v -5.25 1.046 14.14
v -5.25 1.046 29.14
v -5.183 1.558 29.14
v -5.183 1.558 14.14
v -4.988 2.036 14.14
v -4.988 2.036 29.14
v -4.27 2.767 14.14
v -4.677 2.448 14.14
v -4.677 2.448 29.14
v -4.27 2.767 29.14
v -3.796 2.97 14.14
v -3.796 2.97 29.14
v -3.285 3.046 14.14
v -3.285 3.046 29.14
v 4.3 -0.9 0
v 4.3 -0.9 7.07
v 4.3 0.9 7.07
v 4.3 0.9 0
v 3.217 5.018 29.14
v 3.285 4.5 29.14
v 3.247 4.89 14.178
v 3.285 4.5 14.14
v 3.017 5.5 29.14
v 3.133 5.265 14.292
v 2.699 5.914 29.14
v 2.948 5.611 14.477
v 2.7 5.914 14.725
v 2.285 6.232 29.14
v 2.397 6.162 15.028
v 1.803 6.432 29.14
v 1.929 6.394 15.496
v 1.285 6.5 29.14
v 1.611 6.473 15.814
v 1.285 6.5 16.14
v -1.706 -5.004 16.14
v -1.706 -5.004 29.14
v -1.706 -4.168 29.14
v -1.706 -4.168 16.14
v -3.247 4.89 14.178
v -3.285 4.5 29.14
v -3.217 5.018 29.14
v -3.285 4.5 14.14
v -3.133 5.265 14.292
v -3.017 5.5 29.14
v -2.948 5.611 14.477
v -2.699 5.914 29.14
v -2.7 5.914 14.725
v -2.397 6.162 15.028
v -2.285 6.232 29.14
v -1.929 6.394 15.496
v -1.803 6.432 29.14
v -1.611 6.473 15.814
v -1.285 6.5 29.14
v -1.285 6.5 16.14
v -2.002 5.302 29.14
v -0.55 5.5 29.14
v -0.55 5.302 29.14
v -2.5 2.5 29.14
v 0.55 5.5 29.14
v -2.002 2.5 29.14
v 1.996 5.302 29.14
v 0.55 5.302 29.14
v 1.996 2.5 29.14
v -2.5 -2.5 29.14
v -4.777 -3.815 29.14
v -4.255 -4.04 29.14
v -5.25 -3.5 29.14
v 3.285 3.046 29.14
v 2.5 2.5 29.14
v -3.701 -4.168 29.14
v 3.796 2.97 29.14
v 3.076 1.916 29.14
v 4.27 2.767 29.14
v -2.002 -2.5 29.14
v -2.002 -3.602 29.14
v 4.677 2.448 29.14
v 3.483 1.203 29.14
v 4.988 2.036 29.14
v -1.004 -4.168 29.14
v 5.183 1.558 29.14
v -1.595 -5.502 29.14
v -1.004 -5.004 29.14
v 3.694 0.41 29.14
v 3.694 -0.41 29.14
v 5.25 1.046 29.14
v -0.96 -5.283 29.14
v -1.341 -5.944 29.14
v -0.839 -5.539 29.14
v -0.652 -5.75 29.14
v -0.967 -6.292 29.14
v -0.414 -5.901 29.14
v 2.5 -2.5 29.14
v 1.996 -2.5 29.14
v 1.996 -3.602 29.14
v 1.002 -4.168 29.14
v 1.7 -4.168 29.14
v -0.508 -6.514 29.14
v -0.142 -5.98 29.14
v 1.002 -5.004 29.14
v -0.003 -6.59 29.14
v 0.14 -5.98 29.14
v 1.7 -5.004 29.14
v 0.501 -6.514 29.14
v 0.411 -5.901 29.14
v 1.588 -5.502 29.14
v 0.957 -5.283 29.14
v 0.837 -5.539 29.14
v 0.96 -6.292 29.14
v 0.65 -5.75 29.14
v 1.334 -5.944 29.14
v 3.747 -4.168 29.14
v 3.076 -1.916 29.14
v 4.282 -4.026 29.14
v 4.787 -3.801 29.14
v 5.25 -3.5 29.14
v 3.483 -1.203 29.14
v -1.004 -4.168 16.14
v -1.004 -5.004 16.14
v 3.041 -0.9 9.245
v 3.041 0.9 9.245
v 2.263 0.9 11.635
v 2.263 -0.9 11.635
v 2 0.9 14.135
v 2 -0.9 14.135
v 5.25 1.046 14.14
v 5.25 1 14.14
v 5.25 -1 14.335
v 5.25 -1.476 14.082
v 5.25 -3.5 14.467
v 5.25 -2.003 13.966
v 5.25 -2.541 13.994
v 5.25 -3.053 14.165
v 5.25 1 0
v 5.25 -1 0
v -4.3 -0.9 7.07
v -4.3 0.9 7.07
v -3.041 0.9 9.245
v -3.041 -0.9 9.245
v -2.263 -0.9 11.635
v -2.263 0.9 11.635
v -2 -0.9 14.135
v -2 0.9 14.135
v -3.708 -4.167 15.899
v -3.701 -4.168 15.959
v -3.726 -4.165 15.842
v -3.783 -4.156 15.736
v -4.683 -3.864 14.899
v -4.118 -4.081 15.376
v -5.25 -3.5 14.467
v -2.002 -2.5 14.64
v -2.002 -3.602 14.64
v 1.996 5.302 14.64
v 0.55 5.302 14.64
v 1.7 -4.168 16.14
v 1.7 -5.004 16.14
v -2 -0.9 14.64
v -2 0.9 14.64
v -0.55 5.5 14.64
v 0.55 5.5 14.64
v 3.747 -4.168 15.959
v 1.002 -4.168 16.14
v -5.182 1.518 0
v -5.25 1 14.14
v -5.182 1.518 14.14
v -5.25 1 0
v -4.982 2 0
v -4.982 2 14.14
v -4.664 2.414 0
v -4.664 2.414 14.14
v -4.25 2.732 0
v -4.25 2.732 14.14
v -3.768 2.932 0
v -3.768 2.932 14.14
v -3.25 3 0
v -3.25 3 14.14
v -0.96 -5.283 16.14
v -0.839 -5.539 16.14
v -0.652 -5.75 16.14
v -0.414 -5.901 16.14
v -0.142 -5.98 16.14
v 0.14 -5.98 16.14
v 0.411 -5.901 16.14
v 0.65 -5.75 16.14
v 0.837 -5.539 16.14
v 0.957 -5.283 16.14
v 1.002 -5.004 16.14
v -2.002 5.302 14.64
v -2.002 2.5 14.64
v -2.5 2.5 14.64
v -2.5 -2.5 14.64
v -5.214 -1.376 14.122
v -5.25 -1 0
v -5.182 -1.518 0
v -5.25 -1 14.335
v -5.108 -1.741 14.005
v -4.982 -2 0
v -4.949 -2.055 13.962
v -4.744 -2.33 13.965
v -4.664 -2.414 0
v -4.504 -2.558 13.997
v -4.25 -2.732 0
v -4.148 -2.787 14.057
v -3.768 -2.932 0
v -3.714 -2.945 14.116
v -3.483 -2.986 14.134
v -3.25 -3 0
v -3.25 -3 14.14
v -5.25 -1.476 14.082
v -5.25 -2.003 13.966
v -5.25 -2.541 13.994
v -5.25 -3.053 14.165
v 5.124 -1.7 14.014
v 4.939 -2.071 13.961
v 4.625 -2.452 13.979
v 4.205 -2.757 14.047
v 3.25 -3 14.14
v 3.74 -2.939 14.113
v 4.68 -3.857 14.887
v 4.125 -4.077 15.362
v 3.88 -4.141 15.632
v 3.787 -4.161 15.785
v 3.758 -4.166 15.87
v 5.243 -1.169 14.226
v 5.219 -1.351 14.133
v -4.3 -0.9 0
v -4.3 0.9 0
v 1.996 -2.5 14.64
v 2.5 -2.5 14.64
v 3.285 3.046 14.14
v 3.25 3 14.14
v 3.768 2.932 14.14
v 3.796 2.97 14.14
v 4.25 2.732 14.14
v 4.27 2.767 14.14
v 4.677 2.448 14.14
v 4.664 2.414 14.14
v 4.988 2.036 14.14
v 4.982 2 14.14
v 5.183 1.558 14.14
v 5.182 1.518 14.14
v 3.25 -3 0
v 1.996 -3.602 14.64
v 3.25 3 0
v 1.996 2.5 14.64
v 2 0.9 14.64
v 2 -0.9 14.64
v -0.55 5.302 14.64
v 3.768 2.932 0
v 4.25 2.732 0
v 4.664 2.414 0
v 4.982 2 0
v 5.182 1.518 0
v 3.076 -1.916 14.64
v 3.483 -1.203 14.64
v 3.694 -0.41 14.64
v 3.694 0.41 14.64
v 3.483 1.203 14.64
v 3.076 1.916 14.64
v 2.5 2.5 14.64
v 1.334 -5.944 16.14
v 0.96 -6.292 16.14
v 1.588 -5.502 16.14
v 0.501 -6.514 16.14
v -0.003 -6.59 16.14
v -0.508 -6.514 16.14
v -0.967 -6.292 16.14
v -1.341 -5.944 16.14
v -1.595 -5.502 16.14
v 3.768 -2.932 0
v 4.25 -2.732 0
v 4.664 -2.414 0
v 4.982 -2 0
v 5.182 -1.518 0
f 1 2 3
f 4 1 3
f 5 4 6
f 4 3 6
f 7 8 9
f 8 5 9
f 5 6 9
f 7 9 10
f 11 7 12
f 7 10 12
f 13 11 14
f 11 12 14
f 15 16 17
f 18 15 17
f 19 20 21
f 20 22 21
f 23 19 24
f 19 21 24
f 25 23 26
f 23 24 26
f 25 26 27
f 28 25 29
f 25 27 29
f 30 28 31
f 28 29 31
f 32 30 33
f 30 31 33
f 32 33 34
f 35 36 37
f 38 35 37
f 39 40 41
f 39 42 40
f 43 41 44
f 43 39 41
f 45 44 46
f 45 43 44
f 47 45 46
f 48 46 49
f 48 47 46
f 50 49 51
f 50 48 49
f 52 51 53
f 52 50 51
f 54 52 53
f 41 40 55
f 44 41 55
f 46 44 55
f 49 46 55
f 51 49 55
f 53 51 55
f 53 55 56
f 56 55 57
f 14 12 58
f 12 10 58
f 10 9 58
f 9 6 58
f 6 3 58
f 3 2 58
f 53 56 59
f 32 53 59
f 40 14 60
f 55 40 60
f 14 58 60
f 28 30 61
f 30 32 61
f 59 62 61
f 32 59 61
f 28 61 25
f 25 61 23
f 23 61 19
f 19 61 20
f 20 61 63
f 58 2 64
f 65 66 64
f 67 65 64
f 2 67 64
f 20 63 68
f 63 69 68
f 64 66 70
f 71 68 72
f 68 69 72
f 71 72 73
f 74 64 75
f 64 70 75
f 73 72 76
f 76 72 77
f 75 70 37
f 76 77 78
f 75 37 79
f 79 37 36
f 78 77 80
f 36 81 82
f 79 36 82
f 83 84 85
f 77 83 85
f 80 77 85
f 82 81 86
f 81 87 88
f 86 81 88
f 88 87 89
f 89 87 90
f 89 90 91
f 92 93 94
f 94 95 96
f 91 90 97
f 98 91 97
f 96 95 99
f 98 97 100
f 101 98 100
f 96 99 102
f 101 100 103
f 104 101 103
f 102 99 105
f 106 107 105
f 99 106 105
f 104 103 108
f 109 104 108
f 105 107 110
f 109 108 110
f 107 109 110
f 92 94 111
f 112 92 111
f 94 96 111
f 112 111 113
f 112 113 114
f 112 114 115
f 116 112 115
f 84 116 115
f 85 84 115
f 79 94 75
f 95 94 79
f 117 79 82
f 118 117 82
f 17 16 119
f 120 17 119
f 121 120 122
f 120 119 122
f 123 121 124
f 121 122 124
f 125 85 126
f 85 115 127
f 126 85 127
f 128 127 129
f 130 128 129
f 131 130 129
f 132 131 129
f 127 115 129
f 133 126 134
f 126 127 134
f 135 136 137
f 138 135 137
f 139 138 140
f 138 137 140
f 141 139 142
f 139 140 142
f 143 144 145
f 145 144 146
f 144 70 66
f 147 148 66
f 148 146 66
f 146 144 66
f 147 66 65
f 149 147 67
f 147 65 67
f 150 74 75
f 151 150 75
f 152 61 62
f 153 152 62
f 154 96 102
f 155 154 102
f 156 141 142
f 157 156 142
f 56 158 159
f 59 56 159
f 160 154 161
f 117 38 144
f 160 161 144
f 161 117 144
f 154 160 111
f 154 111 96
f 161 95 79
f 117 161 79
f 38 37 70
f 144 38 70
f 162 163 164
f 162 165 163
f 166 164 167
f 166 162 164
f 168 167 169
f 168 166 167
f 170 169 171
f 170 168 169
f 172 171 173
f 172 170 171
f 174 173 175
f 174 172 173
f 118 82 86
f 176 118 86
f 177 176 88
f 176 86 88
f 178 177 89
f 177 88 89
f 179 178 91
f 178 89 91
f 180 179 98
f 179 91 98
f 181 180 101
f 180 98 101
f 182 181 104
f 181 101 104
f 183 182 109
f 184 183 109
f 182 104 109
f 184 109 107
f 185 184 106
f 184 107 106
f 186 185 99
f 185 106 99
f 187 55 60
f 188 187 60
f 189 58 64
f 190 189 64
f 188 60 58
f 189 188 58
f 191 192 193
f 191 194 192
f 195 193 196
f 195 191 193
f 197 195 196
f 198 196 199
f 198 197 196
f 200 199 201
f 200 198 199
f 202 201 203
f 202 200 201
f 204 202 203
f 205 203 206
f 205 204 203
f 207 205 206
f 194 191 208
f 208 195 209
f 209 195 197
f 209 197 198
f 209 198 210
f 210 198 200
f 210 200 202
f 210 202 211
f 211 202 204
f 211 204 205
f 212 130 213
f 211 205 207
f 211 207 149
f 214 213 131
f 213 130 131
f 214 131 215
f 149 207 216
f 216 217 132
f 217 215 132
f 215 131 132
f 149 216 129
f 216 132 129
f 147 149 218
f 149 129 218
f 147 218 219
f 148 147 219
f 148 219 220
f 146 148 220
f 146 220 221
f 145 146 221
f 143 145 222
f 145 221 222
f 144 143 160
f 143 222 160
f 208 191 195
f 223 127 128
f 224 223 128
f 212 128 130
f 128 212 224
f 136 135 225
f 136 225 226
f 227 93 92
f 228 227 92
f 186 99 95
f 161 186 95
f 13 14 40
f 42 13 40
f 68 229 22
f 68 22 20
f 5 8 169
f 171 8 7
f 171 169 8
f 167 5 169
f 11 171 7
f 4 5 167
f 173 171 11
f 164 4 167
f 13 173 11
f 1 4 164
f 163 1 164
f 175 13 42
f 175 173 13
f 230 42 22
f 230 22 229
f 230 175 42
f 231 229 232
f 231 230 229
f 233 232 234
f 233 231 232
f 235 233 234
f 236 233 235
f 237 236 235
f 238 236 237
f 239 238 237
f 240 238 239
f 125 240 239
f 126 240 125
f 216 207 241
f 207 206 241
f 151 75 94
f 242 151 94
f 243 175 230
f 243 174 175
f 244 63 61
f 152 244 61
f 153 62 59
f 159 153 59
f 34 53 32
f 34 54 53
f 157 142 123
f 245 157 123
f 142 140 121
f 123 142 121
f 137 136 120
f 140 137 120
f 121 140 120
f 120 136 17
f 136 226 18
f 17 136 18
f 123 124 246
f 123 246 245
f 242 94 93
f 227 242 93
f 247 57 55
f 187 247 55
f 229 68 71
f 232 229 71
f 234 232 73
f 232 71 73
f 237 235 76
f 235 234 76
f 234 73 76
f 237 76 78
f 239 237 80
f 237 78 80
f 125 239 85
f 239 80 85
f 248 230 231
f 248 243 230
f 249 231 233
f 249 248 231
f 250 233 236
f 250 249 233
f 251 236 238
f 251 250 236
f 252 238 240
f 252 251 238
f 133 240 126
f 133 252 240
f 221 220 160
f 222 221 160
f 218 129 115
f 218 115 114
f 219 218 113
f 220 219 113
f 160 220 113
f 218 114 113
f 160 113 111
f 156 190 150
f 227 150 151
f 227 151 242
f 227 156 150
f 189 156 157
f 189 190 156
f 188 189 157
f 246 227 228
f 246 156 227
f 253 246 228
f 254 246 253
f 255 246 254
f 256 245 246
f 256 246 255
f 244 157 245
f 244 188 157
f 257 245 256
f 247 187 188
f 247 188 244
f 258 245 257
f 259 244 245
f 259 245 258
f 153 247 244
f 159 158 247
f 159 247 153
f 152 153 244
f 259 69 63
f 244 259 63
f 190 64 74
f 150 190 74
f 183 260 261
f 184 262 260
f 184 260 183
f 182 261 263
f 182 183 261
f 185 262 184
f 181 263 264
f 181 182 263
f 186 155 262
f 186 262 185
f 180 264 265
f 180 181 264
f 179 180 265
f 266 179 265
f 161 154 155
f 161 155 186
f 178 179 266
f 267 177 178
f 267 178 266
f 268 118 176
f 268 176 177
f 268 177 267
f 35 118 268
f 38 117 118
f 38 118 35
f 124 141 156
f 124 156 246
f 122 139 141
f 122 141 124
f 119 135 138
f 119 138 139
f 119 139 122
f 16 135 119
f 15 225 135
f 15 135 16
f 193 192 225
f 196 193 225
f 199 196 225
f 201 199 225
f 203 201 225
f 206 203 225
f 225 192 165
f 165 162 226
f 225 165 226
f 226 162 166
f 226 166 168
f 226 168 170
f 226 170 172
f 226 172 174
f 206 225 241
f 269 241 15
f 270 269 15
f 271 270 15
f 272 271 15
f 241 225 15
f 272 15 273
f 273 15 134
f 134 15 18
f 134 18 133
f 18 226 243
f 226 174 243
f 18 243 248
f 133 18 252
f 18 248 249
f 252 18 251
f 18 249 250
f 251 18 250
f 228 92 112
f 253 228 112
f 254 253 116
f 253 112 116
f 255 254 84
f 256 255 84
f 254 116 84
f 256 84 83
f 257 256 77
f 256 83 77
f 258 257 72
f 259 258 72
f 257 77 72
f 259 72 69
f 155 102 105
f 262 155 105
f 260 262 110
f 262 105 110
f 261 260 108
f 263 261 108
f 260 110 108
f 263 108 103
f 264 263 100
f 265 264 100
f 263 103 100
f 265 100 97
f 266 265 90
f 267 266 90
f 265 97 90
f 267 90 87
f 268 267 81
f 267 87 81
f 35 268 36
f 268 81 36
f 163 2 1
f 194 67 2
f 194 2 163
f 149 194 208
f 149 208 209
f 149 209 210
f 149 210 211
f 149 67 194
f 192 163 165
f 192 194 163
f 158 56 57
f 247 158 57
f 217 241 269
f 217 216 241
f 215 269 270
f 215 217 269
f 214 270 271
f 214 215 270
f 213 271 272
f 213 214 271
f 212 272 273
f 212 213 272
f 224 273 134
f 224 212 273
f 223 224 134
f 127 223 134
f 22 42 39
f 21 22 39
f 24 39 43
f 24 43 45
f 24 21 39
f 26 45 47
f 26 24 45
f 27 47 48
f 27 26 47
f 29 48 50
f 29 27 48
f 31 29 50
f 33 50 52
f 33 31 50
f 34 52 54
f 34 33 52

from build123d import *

# Parameters (mm, degrees)
SKETCH1_W            = 10.5
SKETCH1_H            = 6
BOSS_EXTRUDE1_DEPTH  = 7.07
SKETCH3_W            = 8.6
SKETCH3_H            = 1.8
CUT_EXTRUDE2_DEPTH   = 17
SKETCH4_W            = 10.5
SKETCH4_H            = 6
BOSS_EXTRUDE2_DEPTH  = 7.07
SKETCH5_W            = 4
SKETCH5_H            = 1.8
CUT_EXTRUDE3_DEPTH   = 19
FILLET1_R            = 12
FILLET2_R            = 12
SKETCH19_W           = 10.5
SKETCH19_H           = 11
SKETCH19_W_2         = 4
SKETCH19_H_2         = 1.8
BOSS_EXTRUDE8_DEPTH  = 15
CUT_EXTRUDE8_DEPTH   = 14.5
SKETCH21_W           = 10.5
SKETCH21_H           = 15
BOSS_EXTRUDE9_DEPTH  = 1
CUT_EXTRUDE10_DEPTH  = 15
FILLET6_R            = 2
FILLET12_R           = 2
BOSS_EXTRUDE15_DEPTH = 13
FILLET15_R           = 2
FILLET16_R           = 2
FILLET17_R           = 2


with BuildPart() as part:
    # Sketch1 → Boss-Extrude1 (new body)
    with BuildSketch(Plane.XY):
        Rectangle(SKETCH1_W, SKETCH1_H)
    extrude(amount=BOSS_EXTRUDE1_DEPTH)

    # Sketch3 → Cut-Extrude2 (cut)
    with BuildSketch(Plane.XY.offset(7.07)):
        Rectangle(SKETCH3_W, SKETCH3_H)
    extrude(amount=-CUT_EXTRUDE2_DEPTH, mode=Mode.SUBTRACT)

    # Sketch4 → Boss-Extrude2 (add)
    with BuildSketch(Plane.XY.offset(7.07)):
        Rectangle(SKETCH4_W, SKETCH4_H)
    extrude(amount=BOSS_EXTRUDE2_DEPTH)

    # Sketch5 → Cut-Extrude3 (cut, symmetric)
    with BuildSketch(Plane.XY.offset(14.14)):
        Rectangle(SKETCH5_W, SKETCH5_H)
    extrude(amount=CUT_EXTRUDE3_DEPTH, both=True, mode=Mode.SUBTRACT)

    # Fillet1
    # the kernel refuses this fillet: 12 mm, written as the material it takes off along each edge
    with BuildSketch(Plane(origin=(2, -0.9, 7.07), x_dir=(1, 0, 0), z_dir=(0, 1, 0))) as fillet1_piece_1:
        with BuildLine():
            CenterArc((12, -7.064700984), FILLET1_R, 143.93341174, 36.06658826)
            Line((0, -7.064700984), (0, 0))
            Line((0, 0), (2.3, 0))
        make_face()
    extrude(amount=1.8, mode=Mode.SUBTRACT)

    # Fillet2
    # the kernel refuses this fillet: 12 mm, written as the material it takes off along each edge
    with BuildSketch(Plane(origin=(-2, 0.9, 7.07), x_dir=(0, 0, 1), z_dir=(0, -1, 0))) as fillet2_piece_1:
        with BuildLine():
            CenterArc((7.064700984, 12), FILLET2_R, 233.93341174, 36.06658826)
            Line((0, 2.3), (0, 0))
            Line((0, 0), (7.064700984, 0))
        make_face()
    extrude(amount=1.8, mode=Mode.SUBTRACT)

    # Sketch19 → Boss-Extrude8 (add)
    with BuildSketch(Plane.XY.offset(14.14)):
        Rectangle(SKETCH19_W, SKETCH19_H)
        Rectangle(SKETCH19_W_2, SKETCH19_H_2, mode=Mode.SUBTRACT)
    extrude(amount=BOSS_EXTRUDE8_DEPTH)

    # Sketch20 → Cut-Extrude8 (cut)
    with BuildSketch(Plane.XY.offset(29.14)):
        with BuildLine():
            Line((1.996194266, 2.5), (1.996194266, 3.60169129))
            Line((1.996194266, 3.60169129), (1.996194266, 5.301713665))
            Line((1.996194266, 5.301713665), (0.55, 5.301713665))
            Line((0.55, 5.301713665), (0.55, 5.5))
            Line((0.55, 5.5), (-0.55, 5.5))
            Line((-0.55, 5.5), (-0.55, 5.301713665))
            Line((-0.55, 5.301713665), (-2.002287503, 5.301713665))
            Line((-2.002287503, 5.301713665), (-2.002287503, 2.5))
            Line((-2.002287503, 2.5), (-2.5, 2.5))
            Line((-2.5, 2.5), (-2.5, -2.5))
            Line((-2.5, -2.5), (-2.002287503, -2.5))
            Line((-2.002287503, -2.5), (-2.002287503, -3.60169129))
            Line((-2.002287503, -3.60169129), (0, -3.60169129))
            Line((0, -3.60169129), (1.996194266, -3.60169129))
            Line((1.996194266, -3.60169129), (1.996194266, -2.5))
            Line((1.996194266, -2.5), (2.5, -2.5))
            ThreePointArc((2.5, -2.5), (3.720567772, 0), (2.5, 2.5))
            Line((2.5, 2.5), (1.996194266, 2.5))
        make_face()
    extrude(amount=-CUT_EXTRUDE8_DEPTH, mode=Mode.SUBTRACT)

    # Sketch21 → Boss-Extrude9 (add)
    with BuildSketch(Plane(origin=(0, 5.5, 0), x_dir=(1, 0, 0), z_dir=(0, 1, 0))):
        with Locations((0, -21.64)):
            Rectangle(SKETCH21_W, SKETCH21_H)
    extrude(amount=BOSS_EXTRUDE9_DEPTH)

    # Sketch22 → Cut-Extrude10 (cut)
    with BuildSketch(Plane.XY.offset(29.14)):
        Polygon((3.285102714, 3.046335485), (5.25, 3.046335485), (5.25, 5.593635507), (5.25, 6.5), (3.747361829, 6.5), (3.285102714, 6.5), (3.285102714, 3.836641371), align=None)
        Polygon((-5.25, 5.593635507), (-5.25, 3.046335485), (-4.265605325, 3.046335485), (-3.285102714, 3.046335485), (-3.285102714, 4.03485795), (-3.285102714, 5.593635507), (-3.285102714, 6.5), (-5.25, 6.5), align=None)
        with BuildLine():
            Line((-5.25, -3.5), (-5.25, -5.5))
            Line((-5.25, -5.5), (5.25, -5.5))
            Line((5.25, -5.5), (5.25, -3.5))
            ThreePointArc((5.25, -3.5), (4.53848024, -3.923585886), (3.747361829, -4.16816109))
            Line((3.747361829, -4.16816109), (-3.701400921, -4.16816109))
            ThreePointArc((-3.701400921, -4.16816109), (-4.521026788, -3.939133518), (-5.25, -3.5))
        make_face()
    extrude(amount=-CUT_EXTRUDE10_DEPTH, mode=Mode.SUBTRACT)

    # Fillet6
    # the kernel refuses this fillet: 2 mm, written as the material it takes off along each edge
    with BuildSketch(Plane(origin=(8.294369106, -4.16816109, 14.14), x_dir=(0, 1, 0), z_dir=(-1, 0, 0))) as fillet6_piece_1:
        with BuildLine():
            CenterArc((2, -1.818802911), FILLET6_R, 114.577232298, 65.422767702)
            Line((0, -1.818802911), (-0.04, -1.818802911))
            Line((-0.04, -1.818802911), (-0.04, 0))
            Line((-0.04, 0), (0, 0.04))
            ThreePointArc((0, 0.04), (0.584080545, 0.04), (1.151524312, 0.036376058))
            Line((1.151524312, 0.036376058), (1.16816109, 0))
        make_face()
    extrude(amount=16.542777304, mode=Mode.SUBTRACT)

    # Fillet12
    fillet12_edges = [part.edges().sort_by_distance(p)[0] for p in [
        (5.25, -3, 7.07),
        (-5.25, -3, 7.07),
        (-5.25, 3, 7.07),
        (5.25, 3, 7.07),
    ]]
    fillet(fillet12_edges, radius=FILLET12_R)

    # Sketch24 → Boss-Extrude15 (add)
    with BuildSketch(Plane.XY.offset(29.14)):
        with BuildLine():
            Line((-1.004242215, -4.5), (-1.004242215, -5.004164362))
            ThreePointArc((-1.004242215, -5.004164362), (-0.001088997, -5.990129828), (1.002064221, -5.004164362))
            Line((1.002064221, -5.004164362), (1.002064221, -4.16816109))
            Line((1.002064221, -4.16816109), (1.699607491, -4.16816109))
            Line((1.699607491, -4.16816109), (1.699607491, -5.004164362))
            ThreePointArc((1.699607491, -5.004164362), (-0.003424292, -6.590087757), (-1.706456074, -5.004164362))
            Line((-1.706456074, -5.004164362), (-1.706456074, -4.16816109))
            Line((-1.706456074, -4.16816109), (-1.004242215, -4.16816109))
            Line((-1.004242215, -4.16816109), (-1.004242215, -4.5))
        make_face()
    extrude(amount=-BOSS_EXTRUDE15_DEPTH)

    # Fillet15
    fillet15_edges = [part.edges().sort_by_distance(p)[0] for p in [
        (0, 6.5, 14.14),
        (-3.285102714, 6.5, 21.64),
        (3.285102714, 6.5, 21.64),
    ]]
    fillet(fillet15_edges, radius=FILLET15_R)

    # Fillet16
    # the kernel refuses this fillet: 2 mm, written as the material it takes off along each edge
    with BuildSketch(Plane(origin=(5.25, 3.046335485, 34.14), x_dir=(-1, 0, 0), z_dir=(0, 0, -1))) as fillet16_piece_1_section:
        with BuildLine():
            CenterArc((FILLET16_R, -FILLET16_R), FILLET16_R, 90, 90)
            Line((0, -FILLET16_R), (0, 0))
            Line((0, 0), (FILLET16_R, 0))
        make_face()
    fillet16_piece_1 = extrude(amount=25, mode=Mode.PRIVATE)
    fillet16_piece_1 = split(fillet16_piece_1, bisect_by=Plane(origin=(3.285102714, 3.046335485, 34.14), z_dir=(1, 0, 0)), keep=Keep.TOP, mode=Mode.PRIVATE)
    add(fillet16_piece_1, mode=Mode.SUBTRACT)

    # Fillet17
    # the kernel refuses this fillet: 2 mm, written as the material it takes off along each edge
    with BuildSketch(Plane(origin=(-5.25, 3.046335485, 34.14), x_dir=(1, 0, 0), z_dir=(0, 0, -1))) as fillet17_piece_1_section:
        with BuildLine():
            CenterArc((FILLET17_R, FILLET17_R), FILLET17_R, 180, 90)
            Line((0, FILLET17_R), (0, 0))
            Line((0, 0), (FILLET17_R, 0))
        make_face()
    fillet17_piece_1 = extrude(amount=25, mode=Mode.PRIVATE)
    fillet17_piece_1 = split(fillet17_piece_1, bisect_by=Plane(origin=(-3.285102714, 3.046335485, 34.14), z_dir=(-1, 0, 0)), keep=Keep.TOP, mode=Mode.PRIVATE)
    add(fillet17_piece_1, mode=Mode.SUBTRACT)


solid = part.part
